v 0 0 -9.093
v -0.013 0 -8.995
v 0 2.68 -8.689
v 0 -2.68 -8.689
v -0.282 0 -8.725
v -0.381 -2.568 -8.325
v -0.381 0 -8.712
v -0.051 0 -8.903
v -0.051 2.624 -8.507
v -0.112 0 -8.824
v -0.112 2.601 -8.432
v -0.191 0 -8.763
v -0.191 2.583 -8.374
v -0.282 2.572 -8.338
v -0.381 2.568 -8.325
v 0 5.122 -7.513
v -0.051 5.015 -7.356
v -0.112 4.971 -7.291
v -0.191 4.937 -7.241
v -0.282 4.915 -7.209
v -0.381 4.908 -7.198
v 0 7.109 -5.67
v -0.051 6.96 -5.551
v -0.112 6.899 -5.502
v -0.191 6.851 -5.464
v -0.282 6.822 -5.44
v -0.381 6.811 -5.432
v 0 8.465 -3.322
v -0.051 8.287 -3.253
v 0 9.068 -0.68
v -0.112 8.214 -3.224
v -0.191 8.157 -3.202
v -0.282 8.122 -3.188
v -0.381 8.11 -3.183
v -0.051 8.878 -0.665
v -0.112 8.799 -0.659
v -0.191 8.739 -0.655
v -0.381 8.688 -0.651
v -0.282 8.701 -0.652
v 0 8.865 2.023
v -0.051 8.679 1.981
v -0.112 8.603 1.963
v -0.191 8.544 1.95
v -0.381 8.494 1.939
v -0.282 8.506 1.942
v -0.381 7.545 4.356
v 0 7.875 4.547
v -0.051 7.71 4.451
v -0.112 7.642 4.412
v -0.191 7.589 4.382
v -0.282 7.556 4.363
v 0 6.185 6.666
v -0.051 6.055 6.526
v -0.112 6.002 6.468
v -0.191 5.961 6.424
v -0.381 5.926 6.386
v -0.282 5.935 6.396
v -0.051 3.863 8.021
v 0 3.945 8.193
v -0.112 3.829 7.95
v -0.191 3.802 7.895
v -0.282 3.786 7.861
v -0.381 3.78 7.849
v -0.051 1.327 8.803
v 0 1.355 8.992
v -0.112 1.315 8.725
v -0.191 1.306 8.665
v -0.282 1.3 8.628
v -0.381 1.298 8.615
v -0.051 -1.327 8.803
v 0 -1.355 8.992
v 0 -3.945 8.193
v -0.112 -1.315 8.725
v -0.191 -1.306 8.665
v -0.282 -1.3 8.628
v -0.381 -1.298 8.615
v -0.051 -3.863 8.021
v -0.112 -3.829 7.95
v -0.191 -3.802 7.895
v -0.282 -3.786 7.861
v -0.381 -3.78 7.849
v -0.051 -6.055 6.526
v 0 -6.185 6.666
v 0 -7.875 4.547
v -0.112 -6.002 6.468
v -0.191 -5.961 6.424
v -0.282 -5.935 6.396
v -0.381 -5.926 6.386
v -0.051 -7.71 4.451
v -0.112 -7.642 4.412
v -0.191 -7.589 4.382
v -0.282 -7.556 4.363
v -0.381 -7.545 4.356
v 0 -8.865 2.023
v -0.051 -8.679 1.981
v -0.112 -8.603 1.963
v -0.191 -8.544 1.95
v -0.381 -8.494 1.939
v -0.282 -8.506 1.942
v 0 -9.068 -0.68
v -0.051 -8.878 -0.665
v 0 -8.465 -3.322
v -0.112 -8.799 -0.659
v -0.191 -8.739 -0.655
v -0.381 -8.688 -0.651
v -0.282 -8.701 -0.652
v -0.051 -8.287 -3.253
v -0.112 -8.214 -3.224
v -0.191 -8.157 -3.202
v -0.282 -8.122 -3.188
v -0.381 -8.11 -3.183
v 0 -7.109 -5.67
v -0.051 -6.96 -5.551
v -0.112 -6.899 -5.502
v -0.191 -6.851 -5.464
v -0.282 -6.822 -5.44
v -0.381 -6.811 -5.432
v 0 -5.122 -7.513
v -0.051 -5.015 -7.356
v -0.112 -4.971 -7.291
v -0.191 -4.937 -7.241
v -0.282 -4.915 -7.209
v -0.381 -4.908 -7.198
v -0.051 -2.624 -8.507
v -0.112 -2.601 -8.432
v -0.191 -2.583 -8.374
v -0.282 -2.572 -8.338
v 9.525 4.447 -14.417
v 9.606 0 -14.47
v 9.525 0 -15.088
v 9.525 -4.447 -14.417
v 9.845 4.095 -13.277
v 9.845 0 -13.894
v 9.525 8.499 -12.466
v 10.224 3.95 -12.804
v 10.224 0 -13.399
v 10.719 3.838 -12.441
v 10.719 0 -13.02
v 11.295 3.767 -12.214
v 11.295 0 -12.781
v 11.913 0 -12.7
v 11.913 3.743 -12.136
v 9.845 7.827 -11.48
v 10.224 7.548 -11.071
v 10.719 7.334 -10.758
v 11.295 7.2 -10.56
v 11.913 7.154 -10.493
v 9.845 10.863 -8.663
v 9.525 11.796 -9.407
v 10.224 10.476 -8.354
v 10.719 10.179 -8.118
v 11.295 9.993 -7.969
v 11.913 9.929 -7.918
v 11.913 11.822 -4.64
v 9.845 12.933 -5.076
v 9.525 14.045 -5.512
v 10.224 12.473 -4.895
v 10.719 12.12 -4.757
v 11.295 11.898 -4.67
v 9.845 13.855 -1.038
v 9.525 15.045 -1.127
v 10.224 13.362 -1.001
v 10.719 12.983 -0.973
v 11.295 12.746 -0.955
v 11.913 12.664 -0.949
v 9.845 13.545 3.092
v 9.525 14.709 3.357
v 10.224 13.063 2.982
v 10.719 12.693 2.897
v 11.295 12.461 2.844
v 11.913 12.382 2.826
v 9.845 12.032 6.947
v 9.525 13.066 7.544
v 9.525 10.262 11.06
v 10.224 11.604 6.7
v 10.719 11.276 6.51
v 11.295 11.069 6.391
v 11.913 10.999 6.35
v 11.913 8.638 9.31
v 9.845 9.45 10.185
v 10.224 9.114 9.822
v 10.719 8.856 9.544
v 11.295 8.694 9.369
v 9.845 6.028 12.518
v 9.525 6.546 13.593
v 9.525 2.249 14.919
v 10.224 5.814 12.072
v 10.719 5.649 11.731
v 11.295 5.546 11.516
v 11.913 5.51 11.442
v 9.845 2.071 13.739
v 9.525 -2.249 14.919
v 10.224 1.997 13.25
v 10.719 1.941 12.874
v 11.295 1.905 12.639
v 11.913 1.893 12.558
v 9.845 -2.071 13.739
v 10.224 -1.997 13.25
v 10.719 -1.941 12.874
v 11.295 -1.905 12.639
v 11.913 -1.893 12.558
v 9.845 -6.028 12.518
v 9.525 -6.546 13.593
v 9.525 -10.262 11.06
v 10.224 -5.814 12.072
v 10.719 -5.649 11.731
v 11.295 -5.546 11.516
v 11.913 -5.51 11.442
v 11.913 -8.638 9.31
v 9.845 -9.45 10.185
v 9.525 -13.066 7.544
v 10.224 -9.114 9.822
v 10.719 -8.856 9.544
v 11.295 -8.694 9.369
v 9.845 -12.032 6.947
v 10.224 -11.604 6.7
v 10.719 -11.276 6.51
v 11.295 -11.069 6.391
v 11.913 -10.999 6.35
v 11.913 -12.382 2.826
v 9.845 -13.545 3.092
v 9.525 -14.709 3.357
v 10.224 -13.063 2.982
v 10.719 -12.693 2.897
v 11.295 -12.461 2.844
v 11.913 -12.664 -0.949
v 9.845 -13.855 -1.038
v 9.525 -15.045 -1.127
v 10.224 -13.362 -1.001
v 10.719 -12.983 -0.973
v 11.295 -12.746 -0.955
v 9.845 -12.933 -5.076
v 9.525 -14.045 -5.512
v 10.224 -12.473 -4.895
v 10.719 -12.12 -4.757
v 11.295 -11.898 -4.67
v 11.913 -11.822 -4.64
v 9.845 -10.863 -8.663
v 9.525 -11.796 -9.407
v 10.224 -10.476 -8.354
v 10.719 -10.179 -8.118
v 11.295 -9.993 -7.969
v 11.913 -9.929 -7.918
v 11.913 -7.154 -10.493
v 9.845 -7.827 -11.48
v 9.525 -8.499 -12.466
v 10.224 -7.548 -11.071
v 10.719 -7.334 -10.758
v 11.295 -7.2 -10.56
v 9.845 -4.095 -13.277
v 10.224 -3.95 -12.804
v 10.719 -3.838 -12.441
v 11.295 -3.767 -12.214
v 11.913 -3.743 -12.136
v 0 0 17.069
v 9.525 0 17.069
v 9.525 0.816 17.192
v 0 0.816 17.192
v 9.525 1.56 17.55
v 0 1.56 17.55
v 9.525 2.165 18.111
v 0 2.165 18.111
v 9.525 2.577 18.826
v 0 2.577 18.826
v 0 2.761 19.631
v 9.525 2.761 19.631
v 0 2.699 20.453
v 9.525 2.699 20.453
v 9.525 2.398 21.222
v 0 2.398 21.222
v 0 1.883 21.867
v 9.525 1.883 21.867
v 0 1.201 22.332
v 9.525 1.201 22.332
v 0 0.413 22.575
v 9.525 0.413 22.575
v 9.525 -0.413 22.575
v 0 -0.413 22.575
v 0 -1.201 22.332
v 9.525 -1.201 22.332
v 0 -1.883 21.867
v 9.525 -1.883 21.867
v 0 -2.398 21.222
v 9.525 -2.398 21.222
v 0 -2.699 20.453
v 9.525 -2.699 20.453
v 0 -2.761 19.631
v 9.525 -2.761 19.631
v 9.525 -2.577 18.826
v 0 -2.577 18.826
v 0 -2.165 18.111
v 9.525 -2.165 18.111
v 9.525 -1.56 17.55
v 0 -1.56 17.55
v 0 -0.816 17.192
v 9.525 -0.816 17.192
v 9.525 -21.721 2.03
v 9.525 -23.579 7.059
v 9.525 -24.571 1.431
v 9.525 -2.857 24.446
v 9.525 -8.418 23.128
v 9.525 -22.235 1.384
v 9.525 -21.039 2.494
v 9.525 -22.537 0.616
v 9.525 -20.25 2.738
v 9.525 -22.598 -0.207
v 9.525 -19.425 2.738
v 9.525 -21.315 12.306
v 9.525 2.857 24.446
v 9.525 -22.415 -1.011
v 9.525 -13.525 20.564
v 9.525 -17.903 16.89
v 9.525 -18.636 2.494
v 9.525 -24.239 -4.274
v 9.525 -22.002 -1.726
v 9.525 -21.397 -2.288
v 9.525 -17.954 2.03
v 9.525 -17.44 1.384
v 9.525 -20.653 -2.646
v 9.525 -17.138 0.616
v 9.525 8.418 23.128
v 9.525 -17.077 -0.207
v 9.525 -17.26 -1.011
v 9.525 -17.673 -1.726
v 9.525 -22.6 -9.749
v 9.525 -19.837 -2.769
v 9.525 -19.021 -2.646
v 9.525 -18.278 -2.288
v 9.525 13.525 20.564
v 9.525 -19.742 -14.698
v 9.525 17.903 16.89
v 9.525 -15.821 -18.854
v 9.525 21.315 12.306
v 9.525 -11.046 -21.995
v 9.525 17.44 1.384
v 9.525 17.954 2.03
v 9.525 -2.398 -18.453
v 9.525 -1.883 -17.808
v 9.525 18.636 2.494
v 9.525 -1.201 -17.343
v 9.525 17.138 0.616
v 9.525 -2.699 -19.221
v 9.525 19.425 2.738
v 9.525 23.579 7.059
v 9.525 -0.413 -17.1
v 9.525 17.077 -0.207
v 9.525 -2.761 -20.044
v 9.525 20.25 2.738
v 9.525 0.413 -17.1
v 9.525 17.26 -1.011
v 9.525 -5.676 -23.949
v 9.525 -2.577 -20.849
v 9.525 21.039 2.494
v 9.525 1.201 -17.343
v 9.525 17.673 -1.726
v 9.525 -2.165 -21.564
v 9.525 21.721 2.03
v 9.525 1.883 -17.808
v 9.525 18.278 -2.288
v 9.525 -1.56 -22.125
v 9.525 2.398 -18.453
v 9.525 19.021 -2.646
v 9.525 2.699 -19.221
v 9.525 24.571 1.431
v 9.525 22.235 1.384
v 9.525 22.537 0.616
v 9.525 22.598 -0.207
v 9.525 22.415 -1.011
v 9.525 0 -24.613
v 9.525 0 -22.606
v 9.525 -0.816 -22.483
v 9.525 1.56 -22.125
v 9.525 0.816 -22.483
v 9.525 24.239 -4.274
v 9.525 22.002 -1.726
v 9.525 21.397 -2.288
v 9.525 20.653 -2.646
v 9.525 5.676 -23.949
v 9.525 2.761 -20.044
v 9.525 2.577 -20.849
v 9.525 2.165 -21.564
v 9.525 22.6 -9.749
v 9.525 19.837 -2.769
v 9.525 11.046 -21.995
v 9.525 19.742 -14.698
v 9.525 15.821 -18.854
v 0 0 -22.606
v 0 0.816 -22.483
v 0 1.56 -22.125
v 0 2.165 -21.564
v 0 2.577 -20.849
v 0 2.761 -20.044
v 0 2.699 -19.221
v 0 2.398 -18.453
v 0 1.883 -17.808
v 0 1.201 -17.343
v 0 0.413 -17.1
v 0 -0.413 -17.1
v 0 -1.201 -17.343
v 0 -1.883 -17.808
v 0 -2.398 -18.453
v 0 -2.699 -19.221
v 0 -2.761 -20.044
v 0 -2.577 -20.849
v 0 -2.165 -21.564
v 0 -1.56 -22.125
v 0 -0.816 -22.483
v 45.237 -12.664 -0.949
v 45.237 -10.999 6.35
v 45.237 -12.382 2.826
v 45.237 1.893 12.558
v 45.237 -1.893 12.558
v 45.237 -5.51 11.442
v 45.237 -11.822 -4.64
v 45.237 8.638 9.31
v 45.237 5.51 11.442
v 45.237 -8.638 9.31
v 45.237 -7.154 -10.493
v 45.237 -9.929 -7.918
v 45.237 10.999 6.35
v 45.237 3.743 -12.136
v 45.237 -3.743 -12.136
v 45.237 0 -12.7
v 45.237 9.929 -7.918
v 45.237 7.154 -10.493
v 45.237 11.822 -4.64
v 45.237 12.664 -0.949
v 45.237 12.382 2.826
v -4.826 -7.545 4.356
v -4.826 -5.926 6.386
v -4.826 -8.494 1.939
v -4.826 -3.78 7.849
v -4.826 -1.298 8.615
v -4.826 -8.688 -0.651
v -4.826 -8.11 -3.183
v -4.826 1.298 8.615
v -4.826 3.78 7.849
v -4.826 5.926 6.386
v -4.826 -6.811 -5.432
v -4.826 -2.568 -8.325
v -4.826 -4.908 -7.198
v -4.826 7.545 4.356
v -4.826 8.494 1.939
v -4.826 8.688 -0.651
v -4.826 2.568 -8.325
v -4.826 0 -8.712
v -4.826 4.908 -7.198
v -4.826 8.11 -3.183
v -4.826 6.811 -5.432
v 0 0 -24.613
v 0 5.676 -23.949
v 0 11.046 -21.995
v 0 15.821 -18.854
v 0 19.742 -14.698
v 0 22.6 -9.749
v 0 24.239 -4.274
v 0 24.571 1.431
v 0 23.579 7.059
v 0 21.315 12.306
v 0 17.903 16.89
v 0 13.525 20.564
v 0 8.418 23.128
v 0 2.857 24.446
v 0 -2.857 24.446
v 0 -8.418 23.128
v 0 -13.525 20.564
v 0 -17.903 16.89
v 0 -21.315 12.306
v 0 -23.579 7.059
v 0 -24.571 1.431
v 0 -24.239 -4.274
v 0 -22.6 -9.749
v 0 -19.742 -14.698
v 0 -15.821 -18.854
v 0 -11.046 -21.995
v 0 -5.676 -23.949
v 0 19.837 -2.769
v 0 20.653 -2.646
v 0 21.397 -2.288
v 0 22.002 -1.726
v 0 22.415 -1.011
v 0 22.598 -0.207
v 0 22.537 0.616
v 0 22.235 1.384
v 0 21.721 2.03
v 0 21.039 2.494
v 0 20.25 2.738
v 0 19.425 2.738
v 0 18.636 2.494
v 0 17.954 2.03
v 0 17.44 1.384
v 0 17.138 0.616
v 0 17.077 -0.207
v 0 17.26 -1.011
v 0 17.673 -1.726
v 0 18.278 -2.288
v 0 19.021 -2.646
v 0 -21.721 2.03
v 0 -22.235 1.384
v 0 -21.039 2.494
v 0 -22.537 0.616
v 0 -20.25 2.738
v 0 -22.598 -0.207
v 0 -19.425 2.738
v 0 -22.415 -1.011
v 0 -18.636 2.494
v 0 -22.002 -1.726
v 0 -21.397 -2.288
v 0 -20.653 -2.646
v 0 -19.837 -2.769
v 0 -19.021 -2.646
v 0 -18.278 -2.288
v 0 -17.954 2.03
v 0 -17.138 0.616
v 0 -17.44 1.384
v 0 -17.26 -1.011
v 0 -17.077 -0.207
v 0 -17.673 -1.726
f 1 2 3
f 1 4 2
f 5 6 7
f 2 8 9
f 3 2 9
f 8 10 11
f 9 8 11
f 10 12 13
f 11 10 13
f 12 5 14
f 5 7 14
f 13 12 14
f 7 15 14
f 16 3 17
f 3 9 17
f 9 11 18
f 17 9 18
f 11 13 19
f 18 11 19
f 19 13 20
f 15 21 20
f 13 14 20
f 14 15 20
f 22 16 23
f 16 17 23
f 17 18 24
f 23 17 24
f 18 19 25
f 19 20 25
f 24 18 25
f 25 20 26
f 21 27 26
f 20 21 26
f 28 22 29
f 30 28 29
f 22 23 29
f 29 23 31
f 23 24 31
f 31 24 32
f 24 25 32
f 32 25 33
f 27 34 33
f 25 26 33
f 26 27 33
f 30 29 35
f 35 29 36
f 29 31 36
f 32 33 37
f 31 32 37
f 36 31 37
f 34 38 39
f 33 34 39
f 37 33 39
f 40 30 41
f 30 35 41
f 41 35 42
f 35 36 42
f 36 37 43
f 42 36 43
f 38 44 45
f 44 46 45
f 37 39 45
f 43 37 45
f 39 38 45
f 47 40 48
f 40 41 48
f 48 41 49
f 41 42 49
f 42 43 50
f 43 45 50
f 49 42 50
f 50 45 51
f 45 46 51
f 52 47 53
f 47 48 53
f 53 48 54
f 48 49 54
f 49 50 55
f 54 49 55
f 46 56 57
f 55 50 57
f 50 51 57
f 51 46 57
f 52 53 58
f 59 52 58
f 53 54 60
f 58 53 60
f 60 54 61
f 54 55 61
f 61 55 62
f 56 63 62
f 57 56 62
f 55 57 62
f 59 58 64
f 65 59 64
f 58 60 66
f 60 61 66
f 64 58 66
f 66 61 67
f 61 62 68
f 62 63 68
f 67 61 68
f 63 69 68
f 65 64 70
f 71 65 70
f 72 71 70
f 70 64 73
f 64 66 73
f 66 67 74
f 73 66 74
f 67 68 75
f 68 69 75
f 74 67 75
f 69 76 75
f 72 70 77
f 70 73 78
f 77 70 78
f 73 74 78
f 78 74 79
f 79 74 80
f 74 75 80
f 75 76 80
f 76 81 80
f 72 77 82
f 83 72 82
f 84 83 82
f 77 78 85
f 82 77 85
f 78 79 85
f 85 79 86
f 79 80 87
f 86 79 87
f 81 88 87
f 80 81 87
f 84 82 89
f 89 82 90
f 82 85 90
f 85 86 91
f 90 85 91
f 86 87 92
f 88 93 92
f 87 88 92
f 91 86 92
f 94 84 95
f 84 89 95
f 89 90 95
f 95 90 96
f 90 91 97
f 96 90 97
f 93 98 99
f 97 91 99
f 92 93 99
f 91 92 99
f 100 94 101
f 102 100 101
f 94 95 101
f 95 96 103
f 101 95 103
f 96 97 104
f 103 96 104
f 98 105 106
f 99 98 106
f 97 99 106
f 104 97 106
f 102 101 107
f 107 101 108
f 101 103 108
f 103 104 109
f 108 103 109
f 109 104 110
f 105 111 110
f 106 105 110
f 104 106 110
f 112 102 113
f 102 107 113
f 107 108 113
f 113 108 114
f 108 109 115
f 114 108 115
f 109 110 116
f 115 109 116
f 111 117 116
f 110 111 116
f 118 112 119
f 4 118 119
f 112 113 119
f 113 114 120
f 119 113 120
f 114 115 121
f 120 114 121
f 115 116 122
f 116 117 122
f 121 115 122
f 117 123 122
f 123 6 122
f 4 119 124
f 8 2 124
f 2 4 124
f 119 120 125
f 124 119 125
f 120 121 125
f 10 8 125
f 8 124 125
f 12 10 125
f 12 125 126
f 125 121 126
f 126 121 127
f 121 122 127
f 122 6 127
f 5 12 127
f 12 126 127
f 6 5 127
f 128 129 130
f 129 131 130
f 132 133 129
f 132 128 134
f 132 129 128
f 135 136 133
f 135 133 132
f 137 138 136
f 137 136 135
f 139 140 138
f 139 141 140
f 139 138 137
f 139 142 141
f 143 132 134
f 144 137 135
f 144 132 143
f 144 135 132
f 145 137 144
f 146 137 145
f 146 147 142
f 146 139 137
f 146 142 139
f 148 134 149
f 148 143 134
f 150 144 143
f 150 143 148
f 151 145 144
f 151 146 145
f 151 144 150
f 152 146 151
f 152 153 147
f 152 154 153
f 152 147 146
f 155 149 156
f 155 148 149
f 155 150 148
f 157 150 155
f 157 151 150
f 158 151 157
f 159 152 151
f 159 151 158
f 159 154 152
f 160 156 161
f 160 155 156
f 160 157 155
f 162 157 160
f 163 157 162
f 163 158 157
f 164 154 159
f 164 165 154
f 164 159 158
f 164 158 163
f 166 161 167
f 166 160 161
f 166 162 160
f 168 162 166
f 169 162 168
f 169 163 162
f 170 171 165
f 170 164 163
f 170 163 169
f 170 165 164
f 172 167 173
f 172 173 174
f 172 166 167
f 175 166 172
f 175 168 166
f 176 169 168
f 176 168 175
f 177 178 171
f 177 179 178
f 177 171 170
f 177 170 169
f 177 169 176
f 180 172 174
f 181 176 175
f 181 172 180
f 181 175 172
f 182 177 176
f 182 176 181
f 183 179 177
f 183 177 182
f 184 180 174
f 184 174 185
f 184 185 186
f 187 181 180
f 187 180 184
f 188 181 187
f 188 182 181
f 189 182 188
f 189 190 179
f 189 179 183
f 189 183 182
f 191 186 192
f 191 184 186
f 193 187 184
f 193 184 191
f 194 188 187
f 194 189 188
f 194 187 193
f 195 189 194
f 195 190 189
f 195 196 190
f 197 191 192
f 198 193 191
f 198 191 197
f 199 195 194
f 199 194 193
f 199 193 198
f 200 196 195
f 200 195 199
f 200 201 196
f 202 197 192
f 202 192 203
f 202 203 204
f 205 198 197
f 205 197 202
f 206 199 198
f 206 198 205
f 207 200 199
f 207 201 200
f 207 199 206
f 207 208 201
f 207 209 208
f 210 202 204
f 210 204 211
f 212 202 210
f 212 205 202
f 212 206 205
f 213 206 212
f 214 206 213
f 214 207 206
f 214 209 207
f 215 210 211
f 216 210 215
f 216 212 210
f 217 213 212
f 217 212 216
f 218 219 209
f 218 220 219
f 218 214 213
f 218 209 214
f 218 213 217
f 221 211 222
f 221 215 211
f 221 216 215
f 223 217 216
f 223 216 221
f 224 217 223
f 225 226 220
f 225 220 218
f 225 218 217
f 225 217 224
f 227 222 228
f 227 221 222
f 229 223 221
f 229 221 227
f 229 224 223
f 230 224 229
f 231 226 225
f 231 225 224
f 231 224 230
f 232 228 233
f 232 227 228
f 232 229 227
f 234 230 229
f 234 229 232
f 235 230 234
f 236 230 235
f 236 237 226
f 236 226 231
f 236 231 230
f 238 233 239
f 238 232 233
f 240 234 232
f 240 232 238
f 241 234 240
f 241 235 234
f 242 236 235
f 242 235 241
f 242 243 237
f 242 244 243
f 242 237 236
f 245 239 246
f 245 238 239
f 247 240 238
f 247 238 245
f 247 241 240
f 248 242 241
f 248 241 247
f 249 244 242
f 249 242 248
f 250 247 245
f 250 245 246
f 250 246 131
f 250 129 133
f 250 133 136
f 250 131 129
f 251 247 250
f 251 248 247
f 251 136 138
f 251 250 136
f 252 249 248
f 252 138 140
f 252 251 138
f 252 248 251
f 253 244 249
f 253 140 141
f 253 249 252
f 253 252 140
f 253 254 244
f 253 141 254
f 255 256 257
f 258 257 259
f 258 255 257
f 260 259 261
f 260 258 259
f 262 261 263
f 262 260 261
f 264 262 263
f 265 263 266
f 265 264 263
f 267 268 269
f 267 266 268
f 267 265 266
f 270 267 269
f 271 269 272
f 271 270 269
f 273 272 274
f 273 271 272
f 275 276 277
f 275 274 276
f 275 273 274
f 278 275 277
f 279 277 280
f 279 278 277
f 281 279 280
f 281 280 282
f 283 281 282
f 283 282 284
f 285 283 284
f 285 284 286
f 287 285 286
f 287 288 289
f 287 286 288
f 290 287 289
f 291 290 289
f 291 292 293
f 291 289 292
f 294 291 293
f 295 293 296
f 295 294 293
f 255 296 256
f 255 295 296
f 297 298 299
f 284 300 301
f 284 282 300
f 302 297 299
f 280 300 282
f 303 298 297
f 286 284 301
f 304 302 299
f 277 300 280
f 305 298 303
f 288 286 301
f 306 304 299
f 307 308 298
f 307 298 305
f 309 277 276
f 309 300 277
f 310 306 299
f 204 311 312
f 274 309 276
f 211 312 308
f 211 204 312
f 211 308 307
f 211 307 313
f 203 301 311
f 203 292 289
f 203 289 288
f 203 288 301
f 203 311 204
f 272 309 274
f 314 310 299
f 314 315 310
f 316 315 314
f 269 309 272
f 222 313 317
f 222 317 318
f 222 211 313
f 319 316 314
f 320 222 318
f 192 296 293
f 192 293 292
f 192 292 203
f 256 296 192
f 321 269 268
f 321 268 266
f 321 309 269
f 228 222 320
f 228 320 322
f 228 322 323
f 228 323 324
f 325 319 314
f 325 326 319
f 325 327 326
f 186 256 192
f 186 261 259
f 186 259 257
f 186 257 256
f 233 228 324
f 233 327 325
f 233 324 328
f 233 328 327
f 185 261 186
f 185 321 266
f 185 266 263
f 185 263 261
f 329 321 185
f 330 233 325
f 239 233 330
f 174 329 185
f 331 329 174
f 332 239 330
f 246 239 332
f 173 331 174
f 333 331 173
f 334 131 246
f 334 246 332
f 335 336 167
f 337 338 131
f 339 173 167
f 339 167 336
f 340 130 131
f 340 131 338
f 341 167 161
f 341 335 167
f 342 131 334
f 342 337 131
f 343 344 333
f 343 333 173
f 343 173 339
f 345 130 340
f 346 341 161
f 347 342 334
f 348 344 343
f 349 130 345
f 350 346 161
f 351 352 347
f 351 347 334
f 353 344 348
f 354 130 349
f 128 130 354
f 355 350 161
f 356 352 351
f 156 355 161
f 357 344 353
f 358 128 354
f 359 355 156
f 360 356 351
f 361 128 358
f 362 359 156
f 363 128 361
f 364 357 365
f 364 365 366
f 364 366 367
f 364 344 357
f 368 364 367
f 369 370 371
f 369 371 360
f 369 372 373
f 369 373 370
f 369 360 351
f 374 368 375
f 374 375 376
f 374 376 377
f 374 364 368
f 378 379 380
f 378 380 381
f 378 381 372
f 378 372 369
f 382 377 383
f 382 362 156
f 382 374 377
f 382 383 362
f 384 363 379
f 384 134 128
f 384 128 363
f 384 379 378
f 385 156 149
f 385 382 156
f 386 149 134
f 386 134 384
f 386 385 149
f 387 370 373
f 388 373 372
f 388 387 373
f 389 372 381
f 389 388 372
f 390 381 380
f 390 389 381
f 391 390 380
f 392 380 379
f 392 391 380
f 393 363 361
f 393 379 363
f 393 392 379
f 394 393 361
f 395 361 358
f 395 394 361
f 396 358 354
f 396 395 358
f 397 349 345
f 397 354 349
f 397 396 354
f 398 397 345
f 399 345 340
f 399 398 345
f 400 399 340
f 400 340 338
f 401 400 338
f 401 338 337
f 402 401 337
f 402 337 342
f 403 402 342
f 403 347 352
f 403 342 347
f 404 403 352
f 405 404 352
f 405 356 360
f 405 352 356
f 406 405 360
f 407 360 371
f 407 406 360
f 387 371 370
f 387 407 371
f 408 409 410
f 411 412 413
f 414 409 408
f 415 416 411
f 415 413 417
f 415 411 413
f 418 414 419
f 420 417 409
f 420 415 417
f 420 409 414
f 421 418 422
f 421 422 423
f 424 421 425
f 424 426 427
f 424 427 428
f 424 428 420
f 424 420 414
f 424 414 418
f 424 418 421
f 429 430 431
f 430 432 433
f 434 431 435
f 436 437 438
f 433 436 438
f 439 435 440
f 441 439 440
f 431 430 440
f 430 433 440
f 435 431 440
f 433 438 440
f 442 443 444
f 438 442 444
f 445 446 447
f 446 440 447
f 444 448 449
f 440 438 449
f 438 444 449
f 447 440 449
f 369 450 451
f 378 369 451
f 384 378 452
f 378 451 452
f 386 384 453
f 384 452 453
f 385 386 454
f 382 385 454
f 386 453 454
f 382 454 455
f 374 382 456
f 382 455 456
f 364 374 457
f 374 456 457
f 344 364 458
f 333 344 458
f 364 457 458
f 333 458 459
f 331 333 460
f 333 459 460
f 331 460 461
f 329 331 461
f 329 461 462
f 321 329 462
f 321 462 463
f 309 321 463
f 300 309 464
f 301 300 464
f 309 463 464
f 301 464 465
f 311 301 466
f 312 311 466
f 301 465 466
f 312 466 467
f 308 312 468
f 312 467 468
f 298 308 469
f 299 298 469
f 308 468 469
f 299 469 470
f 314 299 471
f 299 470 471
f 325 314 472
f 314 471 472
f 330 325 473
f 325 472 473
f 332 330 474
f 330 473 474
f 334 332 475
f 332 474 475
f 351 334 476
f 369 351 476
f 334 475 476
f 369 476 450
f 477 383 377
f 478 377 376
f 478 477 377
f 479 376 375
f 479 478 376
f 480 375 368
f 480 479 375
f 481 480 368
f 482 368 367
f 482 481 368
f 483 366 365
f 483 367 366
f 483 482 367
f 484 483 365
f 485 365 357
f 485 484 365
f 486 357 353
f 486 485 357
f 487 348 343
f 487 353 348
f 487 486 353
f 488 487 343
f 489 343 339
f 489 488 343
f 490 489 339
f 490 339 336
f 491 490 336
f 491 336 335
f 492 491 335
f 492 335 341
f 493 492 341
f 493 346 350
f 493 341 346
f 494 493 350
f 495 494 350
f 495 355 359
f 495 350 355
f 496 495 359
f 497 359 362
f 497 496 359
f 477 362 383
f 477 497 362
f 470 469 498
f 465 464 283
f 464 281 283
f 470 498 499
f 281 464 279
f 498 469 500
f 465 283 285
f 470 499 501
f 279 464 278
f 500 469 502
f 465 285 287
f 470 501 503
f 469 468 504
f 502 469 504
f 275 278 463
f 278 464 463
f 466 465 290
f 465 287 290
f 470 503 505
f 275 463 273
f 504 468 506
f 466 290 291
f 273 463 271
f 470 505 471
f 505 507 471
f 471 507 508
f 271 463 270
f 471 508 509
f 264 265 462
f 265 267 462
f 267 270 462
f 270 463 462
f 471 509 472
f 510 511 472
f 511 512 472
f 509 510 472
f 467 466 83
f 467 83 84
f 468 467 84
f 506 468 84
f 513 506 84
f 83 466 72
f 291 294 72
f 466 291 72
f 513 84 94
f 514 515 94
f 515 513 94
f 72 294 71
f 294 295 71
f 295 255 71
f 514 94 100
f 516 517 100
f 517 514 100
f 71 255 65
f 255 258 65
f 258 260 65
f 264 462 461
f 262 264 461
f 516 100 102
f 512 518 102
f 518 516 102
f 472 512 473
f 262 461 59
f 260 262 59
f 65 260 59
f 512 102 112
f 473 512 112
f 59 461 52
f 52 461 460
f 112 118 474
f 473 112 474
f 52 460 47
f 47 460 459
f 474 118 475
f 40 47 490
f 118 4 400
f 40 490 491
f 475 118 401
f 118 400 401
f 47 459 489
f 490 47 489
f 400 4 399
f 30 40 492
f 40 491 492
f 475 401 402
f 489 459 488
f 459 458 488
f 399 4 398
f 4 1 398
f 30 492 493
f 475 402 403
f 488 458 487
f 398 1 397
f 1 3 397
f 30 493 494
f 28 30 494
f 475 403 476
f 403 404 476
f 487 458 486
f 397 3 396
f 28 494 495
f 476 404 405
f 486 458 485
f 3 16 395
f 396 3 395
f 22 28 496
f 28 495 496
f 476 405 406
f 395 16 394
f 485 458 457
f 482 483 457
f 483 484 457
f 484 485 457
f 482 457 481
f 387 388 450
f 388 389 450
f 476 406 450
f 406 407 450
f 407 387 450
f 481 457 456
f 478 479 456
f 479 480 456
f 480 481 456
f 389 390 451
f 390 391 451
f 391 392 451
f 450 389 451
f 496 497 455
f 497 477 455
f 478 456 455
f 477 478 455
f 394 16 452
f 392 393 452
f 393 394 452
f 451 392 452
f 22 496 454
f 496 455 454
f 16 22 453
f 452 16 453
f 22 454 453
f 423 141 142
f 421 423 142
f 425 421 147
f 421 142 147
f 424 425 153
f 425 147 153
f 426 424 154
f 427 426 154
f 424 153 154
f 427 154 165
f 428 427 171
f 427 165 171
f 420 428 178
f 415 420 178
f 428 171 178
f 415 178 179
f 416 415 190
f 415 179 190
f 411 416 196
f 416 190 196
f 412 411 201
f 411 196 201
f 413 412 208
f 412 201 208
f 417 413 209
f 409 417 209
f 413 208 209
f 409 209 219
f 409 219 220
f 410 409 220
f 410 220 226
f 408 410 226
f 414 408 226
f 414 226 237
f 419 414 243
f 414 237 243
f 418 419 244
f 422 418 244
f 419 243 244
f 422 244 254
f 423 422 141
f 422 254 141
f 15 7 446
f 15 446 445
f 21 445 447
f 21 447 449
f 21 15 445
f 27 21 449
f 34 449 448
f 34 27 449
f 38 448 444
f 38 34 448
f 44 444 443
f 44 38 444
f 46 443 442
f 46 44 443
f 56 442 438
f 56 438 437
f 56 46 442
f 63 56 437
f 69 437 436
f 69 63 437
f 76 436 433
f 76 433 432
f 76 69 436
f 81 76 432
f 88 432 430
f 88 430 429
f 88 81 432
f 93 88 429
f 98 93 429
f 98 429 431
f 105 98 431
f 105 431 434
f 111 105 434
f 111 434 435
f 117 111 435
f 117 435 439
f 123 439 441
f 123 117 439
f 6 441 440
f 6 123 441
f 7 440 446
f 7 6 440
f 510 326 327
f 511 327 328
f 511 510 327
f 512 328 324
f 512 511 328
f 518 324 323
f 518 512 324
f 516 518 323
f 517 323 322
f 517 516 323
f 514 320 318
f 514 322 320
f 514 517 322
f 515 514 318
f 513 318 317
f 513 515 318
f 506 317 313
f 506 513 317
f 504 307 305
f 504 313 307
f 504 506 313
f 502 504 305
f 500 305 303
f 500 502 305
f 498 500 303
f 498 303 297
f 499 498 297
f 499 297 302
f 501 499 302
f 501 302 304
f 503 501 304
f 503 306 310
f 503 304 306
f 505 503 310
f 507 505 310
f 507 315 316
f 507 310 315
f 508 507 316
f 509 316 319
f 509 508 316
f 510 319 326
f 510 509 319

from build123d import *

# Parameters (mm, degrees)
SKETCH1_R           = 24.6126
BOSS_EXTRUDE1_DEPTH = 9.525
BOSS_EXTRUDE2_START = 9.525
SKETCH2_R           = 12.7
BOSS_EXTRUDE2_DEPTH = 35.7124
SKETCH3_R           = 8.7122
BOSS_EXTRUDE4_DEPTH = 4.826
SKETCH4_R           = 2.7686
CUT_EXTRUDE2_DEPTH  = 58.078739617
FILLET1_R           = 0.381
FILLET2_R           = 2.3876


with BuildPart() as part:
    # Sketch1 → Boss-Extrude1 (new body)
    with BuildSketch(Plane.YZ):
        with Locations(Location((0, 0, 0), (0, 0, 270))):
            Circle(SKETCH1_R)
    extrude(amount=BOSS_EXTRUDE1_DEPTH)

    # Sketch2 → Boss-Extrude2 (add)
    with BuildSketch(Plane.YZ.offset(BOSS_EXTRUDE2_START)):
        with Locations(Location((0, 0, 0), (0, 0, 270))):
            Circle(SKETCH2_R)
    extrude(amount=BOSS_EXTRUDE2_DEPTH)

    # Sketch3 → Boss-Extrude4 (add)
    with BuildSketch(Plane.YZ):
        with Locations(Location((0, 0, 0), (0, 0, 270))):
            Circle(SKETCH3_R)
    extrude(amount=-BOSS_EXTRUDE4_DEPTH)

    # Sketch4 → Cut-Extrude2 (cut, through all)
    with BuildSketch(Plane.YZ):
        with Locations(Location((0, 19.8374, 0), (0, 0, 270))):
            Circle(SKETCH4_R)
        with Locations(Location((19.8374, 0, 0), (0, 0, 270))):
            Circle(SKETCH4_R)
        with Locations(Location((0, -19.8374, 0), (0, 0, 270))):
            Circle(SKETCH4_R)
        with Locations(Location((-19.8374, 0, 0), (0, 0, 270))):
            Circle(SKETCH4_R)
    extrude(amount=CUT_EXTRUDE2_DEPTH, mode=Mode.SUBTRACT)

    # Fillet1
    fillet1_edges = [part.edges().sort_by_distance(p)[0] for p in [
        (0, 0, 8.7122),
    ]]
    fillet(fillet1_edges, radius=FILLET1_R)

    # Fillet2
    fillet2_edges = [part.edges().sort_by_distance(p)[0] for p in [
        (9.525, 0, 12.7),
    ]]
    fillet(fillet2_edges, radius=FILLET2_R)


solid = part.part
